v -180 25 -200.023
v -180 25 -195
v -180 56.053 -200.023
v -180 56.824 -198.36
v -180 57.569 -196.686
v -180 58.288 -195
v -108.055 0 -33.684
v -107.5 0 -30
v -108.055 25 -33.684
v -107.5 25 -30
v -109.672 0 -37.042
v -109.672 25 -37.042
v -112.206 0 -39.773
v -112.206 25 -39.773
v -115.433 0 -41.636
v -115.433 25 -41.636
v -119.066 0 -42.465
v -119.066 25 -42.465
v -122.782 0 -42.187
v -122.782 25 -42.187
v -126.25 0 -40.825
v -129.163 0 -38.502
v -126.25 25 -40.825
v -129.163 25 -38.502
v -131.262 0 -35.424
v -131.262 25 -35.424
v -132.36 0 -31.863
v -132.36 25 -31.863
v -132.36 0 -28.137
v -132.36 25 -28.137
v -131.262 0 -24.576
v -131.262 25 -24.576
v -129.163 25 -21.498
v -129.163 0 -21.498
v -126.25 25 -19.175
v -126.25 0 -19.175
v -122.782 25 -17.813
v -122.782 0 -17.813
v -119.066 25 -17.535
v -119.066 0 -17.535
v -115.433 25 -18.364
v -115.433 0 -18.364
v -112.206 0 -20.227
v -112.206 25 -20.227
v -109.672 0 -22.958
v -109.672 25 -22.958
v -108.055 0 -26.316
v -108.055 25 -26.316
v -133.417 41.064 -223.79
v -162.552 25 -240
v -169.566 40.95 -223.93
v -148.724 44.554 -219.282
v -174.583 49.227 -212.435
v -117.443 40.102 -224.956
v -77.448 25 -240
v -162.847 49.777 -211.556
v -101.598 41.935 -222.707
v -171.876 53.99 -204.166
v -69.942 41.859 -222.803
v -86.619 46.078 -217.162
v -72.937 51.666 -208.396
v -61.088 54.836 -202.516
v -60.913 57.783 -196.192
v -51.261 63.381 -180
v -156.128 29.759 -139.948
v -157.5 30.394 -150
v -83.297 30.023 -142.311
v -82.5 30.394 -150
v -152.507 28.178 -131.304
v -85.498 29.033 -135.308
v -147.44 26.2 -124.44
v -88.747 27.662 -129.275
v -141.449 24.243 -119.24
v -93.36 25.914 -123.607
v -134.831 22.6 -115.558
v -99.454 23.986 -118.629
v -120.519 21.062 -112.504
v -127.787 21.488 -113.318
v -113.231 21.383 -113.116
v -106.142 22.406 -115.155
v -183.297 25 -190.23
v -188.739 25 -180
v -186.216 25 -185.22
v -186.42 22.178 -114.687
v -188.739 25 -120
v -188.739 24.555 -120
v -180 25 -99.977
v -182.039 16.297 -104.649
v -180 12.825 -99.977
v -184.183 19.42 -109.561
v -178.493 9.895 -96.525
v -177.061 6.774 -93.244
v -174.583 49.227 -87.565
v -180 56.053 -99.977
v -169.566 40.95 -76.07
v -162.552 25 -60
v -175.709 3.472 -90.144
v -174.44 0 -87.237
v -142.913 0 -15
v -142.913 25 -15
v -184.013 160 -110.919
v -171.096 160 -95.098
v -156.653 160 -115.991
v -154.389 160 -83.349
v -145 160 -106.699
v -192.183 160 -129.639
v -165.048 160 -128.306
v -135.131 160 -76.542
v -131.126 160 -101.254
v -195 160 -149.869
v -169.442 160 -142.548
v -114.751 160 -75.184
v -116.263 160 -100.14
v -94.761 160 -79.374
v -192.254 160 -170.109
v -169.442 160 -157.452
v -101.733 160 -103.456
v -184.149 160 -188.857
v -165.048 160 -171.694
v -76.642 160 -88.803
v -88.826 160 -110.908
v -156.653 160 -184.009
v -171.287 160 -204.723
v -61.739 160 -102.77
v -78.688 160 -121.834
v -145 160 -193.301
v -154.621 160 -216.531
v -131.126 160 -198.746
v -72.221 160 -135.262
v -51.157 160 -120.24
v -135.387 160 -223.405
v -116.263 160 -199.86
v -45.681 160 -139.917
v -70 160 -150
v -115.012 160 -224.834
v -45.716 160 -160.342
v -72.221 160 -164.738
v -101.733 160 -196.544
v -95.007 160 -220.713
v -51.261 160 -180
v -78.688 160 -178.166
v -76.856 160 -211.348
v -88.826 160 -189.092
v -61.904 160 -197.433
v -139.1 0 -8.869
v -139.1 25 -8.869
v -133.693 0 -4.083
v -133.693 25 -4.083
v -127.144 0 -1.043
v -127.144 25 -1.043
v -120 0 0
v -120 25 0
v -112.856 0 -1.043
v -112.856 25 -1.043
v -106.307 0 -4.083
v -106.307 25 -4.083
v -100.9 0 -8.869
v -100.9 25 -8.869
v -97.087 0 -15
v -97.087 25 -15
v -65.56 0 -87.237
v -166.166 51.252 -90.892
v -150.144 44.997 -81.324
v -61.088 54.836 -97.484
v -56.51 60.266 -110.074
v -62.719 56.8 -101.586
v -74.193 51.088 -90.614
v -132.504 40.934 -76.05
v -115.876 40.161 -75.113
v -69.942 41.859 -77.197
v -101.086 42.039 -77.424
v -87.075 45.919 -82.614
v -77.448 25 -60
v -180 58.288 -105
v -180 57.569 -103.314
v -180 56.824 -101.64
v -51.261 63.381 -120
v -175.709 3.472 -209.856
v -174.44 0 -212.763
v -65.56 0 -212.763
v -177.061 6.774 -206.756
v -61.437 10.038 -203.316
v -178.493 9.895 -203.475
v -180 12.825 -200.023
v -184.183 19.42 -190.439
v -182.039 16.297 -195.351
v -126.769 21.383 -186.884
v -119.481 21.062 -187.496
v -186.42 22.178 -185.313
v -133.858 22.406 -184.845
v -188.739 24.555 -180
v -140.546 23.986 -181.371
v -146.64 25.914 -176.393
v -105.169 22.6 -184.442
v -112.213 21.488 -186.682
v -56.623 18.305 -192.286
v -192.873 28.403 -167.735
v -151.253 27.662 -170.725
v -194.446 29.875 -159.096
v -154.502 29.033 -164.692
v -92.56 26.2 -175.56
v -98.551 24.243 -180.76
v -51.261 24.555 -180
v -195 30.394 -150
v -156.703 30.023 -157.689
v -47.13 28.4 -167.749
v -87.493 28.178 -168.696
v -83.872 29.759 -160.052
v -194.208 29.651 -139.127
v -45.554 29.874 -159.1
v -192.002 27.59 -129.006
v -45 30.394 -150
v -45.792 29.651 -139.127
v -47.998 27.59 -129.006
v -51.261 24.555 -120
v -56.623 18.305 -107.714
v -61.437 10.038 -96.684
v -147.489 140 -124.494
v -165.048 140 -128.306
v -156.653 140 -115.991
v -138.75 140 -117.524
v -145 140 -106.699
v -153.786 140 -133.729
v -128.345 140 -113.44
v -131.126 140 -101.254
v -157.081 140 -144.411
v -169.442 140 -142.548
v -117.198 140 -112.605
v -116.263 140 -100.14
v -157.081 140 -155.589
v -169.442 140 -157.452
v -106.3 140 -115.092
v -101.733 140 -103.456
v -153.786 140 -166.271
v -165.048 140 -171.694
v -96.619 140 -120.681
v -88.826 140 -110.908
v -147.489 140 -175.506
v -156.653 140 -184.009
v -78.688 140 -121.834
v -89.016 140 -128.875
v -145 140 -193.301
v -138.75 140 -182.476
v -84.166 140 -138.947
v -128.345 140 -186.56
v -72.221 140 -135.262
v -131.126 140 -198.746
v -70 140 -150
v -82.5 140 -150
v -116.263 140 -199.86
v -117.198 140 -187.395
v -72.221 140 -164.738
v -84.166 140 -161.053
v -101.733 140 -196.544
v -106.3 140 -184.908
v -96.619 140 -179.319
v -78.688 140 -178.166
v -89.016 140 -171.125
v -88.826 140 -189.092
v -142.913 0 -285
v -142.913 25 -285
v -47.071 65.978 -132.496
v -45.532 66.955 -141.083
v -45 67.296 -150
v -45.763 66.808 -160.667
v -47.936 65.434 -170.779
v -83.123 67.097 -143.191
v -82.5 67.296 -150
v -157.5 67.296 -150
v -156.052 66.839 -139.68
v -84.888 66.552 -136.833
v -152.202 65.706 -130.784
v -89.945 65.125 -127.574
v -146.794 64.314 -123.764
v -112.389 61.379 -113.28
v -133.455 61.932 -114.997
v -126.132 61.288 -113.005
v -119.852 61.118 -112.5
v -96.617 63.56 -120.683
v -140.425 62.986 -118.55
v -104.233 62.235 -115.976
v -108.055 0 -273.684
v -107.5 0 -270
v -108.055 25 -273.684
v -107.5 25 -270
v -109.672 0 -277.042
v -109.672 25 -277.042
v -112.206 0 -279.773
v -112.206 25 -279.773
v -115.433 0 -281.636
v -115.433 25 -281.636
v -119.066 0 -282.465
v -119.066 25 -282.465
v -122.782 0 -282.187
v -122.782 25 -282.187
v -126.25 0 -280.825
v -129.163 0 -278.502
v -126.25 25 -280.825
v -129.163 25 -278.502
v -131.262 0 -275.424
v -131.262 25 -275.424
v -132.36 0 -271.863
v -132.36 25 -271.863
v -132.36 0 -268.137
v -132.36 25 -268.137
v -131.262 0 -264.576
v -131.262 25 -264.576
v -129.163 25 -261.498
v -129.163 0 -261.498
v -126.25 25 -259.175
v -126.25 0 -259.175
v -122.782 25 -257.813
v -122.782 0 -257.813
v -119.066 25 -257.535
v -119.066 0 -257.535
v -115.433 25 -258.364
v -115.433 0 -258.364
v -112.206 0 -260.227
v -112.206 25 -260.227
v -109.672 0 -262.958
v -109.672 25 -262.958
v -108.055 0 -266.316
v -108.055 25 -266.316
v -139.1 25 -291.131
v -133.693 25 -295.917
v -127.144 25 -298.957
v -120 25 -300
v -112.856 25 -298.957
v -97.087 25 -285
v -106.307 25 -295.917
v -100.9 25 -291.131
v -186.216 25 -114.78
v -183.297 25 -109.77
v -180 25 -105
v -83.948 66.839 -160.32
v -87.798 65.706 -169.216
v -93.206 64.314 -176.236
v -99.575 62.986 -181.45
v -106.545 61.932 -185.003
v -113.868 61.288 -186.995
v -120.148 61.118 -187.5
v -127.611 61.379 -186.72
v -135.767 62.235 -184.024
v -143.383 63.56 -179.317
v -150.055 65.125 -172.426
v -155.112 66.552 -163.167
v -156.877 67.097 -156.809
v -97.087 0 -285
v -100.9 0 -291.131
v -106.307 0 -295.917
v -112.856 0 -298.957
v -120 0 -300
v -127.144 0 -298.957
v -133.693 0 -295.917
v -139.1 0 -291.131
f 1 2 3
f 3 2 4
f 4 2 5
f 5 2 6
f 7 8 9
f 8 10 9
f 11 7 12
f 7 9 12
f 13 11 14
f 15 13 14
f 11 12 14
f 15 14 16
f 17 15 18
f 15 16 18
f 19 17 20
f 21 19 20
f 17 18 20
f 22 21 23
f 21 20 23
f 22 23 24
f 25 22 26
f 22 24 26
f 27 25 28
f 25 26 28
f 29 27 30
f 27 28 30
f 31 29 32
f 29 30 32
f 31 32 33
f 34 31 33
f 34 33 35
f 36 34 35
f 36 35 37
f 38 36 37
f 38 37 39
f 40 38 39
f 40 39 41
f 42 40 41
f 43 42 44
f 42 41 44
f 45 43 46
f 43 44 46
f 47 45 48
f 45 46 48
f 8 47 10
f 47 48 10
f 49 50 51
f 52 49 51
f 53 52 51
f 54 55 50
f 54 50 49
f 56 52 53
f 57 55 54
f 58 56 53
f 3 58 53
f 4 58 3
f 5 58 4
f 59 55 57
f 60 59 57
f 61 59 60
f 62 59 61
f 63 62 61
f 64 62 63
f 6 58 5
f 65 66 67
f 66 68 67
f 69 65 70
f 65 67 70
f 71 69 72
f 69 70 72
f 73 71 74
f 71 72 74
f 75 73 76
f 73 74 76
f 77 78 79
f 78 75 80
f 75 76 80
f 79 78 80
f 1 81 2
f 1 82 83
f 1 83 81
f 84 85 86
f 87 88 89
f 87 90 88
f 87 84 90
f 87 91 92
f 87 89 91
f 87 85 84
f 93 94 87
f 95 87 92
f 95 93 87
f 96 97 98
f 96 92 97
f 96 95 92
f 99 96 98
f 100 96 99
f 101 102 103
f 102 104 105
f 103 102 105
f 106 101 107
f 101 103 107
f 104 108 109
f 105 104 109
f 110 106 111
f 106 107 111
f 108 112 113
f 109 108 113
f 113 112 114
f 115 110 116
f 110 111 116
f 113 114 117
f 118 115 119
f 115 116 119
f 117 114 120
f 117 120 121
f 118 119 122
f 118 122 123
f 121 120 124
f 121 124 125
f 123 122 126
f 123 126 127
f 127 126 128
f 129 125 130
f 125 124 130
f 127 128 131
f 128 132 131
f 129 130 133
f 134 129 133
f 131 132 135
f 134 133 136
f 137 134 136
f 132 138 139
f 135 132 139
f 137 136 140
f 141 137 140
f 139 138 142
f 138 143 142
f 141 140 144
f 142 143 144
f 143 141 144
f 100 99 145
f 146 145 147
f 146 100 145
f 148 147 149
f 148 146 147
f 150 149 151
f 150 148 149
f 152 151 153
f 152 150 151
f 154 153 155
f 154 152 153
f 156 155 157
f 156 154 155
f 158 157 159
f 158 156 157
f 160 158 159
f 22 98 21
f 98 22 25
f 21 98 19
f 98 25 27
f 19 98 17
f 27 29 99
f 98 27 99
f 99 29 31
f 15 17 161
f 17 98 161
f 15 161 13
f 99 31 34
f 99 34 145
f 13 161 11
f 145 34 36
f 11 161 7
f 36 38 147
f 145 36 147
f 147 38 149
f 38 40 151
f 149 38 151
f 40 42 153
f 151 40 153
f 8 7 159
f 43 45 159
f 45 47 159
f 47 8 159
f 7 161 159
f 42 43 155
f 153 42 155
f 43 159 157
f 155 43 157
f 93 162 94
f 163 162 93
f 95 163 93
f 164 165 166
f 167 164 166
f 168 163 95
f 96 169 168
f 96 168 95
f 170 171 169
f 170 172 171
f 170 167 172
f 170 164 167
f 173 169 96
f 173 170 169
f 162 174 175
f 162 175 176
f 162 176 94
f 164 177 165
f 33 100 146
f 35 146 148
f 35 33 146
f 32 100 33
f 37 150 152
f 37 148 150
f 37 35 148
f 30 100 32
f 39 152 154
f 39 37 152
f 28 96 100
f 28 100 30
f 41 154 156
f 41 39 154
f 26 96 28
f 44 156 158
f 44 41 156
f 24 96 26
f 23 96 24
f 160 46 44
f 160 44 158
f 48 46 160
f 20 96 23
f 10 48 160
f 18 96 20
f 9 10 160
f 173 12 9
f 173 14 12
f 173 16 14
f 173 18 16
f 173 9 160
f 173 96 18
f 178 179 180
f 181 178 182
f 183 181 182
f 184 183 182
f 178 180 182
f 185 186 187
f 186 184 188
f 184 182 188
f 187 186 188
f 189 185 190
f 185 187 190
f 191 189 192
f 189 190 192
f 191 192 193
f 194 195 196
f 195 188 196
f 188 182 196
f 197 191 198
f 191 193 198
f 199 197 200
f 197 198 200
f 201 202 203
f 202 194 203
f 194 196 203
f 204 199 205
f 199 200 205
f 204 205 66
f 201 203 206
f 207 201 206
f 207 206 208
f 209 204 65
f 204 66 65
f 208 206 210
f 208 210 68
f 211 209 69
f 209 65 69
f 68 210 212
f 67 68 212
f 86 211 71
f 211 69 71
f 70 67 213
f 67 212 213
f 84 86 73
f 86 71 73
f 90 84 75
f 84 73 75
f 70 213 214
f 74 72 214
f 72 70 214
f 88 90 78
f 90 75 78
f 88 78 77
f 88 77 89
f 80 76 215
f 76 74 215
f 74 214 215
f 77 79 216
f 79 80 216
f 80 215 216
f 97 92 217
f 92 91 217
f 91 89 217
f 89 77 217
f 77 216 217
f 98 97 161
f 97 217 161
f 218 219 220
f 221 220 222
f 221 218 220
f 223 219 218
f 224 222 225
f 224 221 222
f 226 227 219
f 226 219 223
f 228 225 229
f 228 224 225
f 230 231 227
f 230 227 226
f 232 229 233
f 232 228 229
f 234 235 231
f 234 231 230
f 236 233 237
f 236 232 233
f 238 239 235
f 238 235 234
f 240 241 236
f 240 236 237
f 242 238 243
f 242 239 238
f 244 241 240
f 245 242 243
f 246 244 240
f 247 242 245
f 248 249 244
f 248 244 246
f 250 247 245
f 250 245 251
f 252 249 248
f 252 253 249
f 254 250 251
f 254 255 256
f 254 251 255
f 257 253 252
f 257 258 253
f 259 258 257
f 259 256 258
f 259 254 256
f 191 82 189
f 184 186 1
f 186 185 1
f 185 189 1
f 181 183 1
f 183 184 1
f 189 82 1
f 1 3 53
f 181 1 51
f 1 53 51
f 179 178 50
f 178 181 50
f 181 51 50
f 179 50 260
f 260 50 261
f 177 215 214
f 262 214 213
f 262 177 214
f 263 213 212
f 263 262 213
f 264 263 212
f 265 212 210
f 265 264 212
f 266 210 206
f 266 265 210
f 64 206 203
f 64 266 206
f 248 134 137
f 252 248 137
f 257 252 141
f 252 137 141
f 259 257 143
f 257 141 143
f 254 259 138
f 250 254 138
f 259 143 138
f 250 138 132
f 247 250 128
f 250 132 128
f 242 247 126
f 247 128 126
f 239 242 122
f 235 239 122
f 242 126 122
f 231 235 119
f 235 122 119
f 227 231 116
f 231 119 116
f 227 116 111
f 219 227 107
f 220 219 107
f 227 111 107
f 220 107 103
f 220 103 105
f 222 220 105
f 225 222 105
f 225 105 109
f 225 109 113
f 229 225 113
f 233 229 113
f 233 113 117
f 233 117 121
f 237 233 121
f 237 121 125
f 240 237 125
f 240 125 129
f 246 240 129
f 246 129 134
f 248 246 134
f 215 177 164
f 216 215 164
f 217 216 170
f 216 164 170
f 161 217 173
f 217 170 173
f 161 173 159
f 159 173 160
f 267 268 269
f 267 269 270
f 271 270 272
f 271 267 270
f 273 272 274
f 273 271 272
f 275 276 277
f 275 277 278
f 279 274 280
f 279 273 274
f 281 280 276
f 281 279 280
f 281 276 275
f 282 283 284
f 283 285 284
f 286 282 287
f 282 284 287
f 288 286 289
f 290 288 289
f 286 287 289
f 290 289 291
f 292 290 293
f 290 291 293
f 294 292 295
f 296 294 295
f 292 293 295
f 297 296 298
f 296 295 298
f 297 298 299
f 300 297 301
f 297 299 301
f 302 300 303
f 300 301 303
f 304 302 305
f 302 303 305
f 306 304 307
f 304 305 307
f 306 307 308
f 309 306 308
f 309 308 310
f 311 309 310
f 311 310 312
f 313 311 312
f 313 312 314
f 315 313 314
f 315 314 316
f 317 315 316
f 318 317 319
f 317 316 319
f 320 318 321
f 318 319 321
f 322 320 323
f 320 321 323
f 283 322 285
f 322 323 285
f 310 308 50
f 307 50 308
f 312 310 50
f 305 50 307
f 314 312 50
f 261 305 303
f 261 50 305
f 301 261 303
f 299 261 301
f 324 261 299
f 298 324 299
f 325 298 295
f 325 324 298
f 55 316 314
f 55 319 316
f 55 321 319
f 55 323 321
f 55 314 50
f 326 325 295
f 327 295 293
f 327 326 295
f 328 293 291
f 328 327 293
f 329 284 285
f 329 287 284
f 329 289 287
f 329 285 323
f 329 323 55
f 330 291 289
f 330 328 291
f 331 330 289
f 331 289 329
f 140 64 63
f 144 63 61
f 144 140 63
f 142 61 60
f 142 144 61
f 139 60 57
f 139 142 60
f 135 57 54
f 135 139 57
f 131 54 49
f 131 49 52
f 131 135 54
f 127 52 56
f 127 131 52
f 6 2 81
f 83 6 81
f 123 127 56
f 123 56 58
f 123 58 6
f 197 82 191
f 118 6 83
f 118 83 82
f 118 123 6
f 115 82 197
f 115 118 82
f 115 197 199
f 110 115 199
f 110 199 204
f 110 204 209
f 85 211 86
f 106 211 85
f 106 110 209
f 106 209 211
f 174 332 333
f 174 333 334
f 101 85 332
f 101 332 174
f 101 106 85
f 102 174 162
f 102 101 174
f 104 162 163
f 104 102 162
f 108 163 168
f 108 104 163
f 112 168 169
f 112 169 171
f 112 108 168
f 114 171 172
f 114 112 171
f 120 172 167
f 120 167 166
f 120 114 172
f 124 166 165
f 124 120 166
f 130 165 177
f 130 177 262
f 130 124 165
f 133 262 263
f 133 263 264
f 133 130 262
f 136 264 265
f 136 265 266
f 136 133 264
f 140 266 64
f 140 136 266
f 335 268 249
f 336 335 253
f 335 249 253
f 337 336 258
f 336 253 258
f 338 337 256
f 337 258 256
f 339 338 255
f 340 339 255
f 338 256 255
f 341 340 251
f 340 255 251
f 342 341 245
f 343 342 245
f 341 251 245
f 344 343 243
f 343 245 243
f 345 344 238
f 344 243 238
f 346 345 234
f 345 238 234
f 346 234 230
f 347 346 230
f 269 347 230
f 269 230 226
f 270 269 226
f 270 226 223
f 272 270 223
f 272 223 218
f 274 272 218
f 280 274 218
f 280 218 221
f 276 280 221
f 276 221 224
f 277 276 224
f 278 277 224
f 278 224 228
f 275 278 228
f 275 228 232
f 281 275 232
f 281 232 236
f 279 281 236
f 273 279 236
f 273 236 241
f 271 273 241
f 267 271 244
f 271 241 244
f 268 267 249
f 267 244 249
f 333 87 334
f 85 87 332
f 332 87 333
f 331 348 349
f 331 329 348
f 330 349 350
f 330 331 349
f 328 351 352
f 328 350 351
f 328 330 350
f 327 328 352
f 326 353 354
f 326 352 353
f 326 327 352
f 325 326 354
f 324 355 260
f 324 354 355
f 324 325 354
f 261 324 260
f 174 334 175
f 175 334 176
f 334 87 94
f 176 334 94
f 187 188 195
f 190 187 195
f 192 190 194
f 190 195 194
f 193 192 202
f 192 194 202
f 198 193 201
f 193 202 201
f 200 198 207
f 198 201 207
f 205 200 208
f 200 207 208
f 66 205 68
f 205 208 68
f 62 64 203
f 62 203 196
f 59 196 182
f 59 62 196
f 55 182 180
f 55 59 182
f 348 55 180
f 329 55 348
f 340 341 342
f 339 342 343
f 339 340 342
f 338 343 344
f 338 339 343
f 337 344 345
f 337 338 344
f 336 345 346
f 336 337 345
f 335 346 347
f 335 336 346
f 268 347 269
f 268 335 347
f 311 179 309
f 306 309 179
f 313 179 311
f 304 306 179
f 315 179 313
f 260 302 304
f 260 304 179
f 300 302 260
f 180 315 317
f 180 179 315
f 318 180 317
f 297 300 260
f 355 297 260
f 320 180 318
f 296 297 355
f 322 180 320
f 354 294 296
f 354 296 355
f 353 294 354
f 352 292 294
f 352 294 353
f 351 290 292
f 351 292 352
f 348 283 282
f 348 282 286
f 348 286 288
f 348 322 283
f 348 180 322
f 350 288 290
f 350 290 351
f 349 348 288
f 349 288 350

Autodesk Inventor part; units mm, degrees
ref_plane "XZ Plane" through (0, 0, 0) normal (0, 1, 0) x (-1, 0, 0)
ref_plane "XY Plane" through (0, 0, 0) normal (0, 0, 1) x (1, 0, 0)
sketch "Sketch1" plane through (0, 0, 0) normal (1, 0, 0) x (0, 1, 0)
  point P0 (0, 0)
sketch "Sketch2" plane through (0, 0, 0) normal (1, 0, 0) x (0, 1, 0)
  line L0 (0, 0) -> (160, 0)
  line L1 (160, 0) -> (160, -300)
  line L2 (160, -300) -> (0, -300)
  line L3 (0, -300) -> (0, 0)
  dimension "d0" = 300
  dimension "d1" = 160
extrude "Extrusion1" add sketch "Sketch2" against normal blind 240
sketch "Sketch3" plane through (0, 160, 0) normal (0, 1, 0) x (1, 0, 0)
  line L0 (-240, 300) -> (-240, 0) projected
  line L1 (-240, 150) -> (0, 150)
  line L2 (0, 0) -> (0, 300) projected
  line L3 (0, 0) -> (-240, 0) projected
  line L4 (-120, 0) -> (-120, 300) construction
  circle A0 centre (-120, 150) radius 75
  circle A1 centre (-120, 150) radius 50
  circle A2 centre (-120, 150) radius 37.5
  line L5 (-120, 30) -> (-120, 270) construction
  circle A3 centre (-120, 270) radius 12.5
  circle A4 centre (-120, 30) radius 12.5
  line L6 (0, 300) -> (-240, 300) projected
  line L7 (-188.7386, 180) -> (-142.9129, 285)
  line L8 (-51.2614, 180) -> (-97.0871, 285)
  arc A5 (-97.0871, 285) -> (-142.9129, 285) centre (-120, 275) ccw
  line L9 (-188.7386, 120) -> (-142.9129, 15)
  line L10 (-51.2614, 120) -> (-97.0871, 15)
  arc A6 (-142.9129, 15) -> (-97.0871, 15) centre (-120, 25) ccw
  point P0 (-120, 300)
  point P1 (-120, 300)
  point P2 (-120, 0)
  dimension "d4" = 150
  dimension "d5" = 100
  dimension "d6" = 75
  dimension "d7" = 240
  dimension "d8" = 25
  dimension "d9" = 25
  dimension "d13" = 25
extrude "Extrusion2" cut sketch "Sketch3" against normal blind 160 contours L6 A5 L7 A0 L1 L0 | L1 A0 L9 A6 L3 L0 | L6 L2 L1 A0 L8 A5 | A6 L10 A0 L1 L2 L3
extrude "Extrusion3" cut sketch "Sketch3" against normal blind 160 contours A3 | A4
extrude "Extrusion4" cut sketch "Sketch3" against normal blind 160 contours A2 L1 | L1 A2
extrude "Extrusion5" cut sketch "Sketch3" against normal blind 20 contours A1 L1 A2 | L1 A2 A1
ref_plane "Work Plane1" through (-45, 160, -150) normal (1, 0, 0) x (0, 1, 0)
sketch "Sketch4" plane through (-45, 160, -150) normal (1, 0, 0) x (0, 1, 0)
  circle A0 centre (-209.6065, 0) radius 80
  line L0 (-20, -37.5) -> (-160, -37.5) projected
  line L1 (-160, -37.5) -> (-160, 37.5) projected
  line L2 (-20, -37.5) -> (-160, -37.5)
  line L3 (-20, -37.5) -> (-20, 37.5) projected
  line L4 (-20, 37.5) -> (-160, 37.5)
  line L5 (-160, 135) -> (-160, 30) projected
  line L6 (0, -30) -> (0, 30) projected
  line L7 (0, 0) -> (-160, 0)
  line L8 (-160, 150) -> (-160, 70)
  line L9 (-160, 150) -> (-160, 90)
  line L10 (-160, 150) -> (-135, 150)
  line L11 (-160, 150) -> (0, 150) projected
  line L12 (-135, 150) -> (-135, -149.8181) construction
  line L13 (-160, 90) -> (-135, 90) construction
  circle A1 centre (-209.6065, 0) radius 116.9023
  line L14 (-160, 105.8552) -> (-160, 62.763) construction
  line L15 (-160, -62.763) -> (-160, -105.8552) construction
  line L16 (-160, 0) -> (-160, -105.8552)
  line L17 (-160, -132.5) -> (-160, -107.5) projected
  point P0 (-160, -62.763)
  point P1 (-160, 105.8552)
  dimension "d22" = 160
  dimension "d23" = 80
  dimension "d24" = 0
  dimension "d25" = 70
  dimension "d26" = 60
  dimension "d31" = 25
extrude "Extrusion6" cut sketch "Sketch4" against normal blind 150 contours L7 L1 L4 A0 | A0 L0 L1 L7 | L4 L5 A0 | A0 L16 L0 | L1 L16 A0 L5
extrude "Extrusion7" cut sketch "Sketch3" against normal blind 135 contours A5 L8 A0 L7 | A6 L9 A0 L10
extrude "Extrusion8" add sketch "Sketch4" against normal blind 135 contours L7 A1 L0 A0 | A0 L4 A1 L7 | A0 L5 A1 L4 | L0 A1 L16 A0 | A0 L16 A1 L5
extrude "Extrusion9" cut sketch "Sketch4" against normal blind 135 contours A0 L16 A1 L5
extrude "Extrusion10" cut sketch "Sketch3" against normal blind 200 contours L6 A5 L7 A0 L1 L0 | L1 A0 L9 A6 L3 L0 | L6 L2 L1 A0 L8 A5 | A6 L10 A0 L1 L2 L3
properties part number "Baitap4"
